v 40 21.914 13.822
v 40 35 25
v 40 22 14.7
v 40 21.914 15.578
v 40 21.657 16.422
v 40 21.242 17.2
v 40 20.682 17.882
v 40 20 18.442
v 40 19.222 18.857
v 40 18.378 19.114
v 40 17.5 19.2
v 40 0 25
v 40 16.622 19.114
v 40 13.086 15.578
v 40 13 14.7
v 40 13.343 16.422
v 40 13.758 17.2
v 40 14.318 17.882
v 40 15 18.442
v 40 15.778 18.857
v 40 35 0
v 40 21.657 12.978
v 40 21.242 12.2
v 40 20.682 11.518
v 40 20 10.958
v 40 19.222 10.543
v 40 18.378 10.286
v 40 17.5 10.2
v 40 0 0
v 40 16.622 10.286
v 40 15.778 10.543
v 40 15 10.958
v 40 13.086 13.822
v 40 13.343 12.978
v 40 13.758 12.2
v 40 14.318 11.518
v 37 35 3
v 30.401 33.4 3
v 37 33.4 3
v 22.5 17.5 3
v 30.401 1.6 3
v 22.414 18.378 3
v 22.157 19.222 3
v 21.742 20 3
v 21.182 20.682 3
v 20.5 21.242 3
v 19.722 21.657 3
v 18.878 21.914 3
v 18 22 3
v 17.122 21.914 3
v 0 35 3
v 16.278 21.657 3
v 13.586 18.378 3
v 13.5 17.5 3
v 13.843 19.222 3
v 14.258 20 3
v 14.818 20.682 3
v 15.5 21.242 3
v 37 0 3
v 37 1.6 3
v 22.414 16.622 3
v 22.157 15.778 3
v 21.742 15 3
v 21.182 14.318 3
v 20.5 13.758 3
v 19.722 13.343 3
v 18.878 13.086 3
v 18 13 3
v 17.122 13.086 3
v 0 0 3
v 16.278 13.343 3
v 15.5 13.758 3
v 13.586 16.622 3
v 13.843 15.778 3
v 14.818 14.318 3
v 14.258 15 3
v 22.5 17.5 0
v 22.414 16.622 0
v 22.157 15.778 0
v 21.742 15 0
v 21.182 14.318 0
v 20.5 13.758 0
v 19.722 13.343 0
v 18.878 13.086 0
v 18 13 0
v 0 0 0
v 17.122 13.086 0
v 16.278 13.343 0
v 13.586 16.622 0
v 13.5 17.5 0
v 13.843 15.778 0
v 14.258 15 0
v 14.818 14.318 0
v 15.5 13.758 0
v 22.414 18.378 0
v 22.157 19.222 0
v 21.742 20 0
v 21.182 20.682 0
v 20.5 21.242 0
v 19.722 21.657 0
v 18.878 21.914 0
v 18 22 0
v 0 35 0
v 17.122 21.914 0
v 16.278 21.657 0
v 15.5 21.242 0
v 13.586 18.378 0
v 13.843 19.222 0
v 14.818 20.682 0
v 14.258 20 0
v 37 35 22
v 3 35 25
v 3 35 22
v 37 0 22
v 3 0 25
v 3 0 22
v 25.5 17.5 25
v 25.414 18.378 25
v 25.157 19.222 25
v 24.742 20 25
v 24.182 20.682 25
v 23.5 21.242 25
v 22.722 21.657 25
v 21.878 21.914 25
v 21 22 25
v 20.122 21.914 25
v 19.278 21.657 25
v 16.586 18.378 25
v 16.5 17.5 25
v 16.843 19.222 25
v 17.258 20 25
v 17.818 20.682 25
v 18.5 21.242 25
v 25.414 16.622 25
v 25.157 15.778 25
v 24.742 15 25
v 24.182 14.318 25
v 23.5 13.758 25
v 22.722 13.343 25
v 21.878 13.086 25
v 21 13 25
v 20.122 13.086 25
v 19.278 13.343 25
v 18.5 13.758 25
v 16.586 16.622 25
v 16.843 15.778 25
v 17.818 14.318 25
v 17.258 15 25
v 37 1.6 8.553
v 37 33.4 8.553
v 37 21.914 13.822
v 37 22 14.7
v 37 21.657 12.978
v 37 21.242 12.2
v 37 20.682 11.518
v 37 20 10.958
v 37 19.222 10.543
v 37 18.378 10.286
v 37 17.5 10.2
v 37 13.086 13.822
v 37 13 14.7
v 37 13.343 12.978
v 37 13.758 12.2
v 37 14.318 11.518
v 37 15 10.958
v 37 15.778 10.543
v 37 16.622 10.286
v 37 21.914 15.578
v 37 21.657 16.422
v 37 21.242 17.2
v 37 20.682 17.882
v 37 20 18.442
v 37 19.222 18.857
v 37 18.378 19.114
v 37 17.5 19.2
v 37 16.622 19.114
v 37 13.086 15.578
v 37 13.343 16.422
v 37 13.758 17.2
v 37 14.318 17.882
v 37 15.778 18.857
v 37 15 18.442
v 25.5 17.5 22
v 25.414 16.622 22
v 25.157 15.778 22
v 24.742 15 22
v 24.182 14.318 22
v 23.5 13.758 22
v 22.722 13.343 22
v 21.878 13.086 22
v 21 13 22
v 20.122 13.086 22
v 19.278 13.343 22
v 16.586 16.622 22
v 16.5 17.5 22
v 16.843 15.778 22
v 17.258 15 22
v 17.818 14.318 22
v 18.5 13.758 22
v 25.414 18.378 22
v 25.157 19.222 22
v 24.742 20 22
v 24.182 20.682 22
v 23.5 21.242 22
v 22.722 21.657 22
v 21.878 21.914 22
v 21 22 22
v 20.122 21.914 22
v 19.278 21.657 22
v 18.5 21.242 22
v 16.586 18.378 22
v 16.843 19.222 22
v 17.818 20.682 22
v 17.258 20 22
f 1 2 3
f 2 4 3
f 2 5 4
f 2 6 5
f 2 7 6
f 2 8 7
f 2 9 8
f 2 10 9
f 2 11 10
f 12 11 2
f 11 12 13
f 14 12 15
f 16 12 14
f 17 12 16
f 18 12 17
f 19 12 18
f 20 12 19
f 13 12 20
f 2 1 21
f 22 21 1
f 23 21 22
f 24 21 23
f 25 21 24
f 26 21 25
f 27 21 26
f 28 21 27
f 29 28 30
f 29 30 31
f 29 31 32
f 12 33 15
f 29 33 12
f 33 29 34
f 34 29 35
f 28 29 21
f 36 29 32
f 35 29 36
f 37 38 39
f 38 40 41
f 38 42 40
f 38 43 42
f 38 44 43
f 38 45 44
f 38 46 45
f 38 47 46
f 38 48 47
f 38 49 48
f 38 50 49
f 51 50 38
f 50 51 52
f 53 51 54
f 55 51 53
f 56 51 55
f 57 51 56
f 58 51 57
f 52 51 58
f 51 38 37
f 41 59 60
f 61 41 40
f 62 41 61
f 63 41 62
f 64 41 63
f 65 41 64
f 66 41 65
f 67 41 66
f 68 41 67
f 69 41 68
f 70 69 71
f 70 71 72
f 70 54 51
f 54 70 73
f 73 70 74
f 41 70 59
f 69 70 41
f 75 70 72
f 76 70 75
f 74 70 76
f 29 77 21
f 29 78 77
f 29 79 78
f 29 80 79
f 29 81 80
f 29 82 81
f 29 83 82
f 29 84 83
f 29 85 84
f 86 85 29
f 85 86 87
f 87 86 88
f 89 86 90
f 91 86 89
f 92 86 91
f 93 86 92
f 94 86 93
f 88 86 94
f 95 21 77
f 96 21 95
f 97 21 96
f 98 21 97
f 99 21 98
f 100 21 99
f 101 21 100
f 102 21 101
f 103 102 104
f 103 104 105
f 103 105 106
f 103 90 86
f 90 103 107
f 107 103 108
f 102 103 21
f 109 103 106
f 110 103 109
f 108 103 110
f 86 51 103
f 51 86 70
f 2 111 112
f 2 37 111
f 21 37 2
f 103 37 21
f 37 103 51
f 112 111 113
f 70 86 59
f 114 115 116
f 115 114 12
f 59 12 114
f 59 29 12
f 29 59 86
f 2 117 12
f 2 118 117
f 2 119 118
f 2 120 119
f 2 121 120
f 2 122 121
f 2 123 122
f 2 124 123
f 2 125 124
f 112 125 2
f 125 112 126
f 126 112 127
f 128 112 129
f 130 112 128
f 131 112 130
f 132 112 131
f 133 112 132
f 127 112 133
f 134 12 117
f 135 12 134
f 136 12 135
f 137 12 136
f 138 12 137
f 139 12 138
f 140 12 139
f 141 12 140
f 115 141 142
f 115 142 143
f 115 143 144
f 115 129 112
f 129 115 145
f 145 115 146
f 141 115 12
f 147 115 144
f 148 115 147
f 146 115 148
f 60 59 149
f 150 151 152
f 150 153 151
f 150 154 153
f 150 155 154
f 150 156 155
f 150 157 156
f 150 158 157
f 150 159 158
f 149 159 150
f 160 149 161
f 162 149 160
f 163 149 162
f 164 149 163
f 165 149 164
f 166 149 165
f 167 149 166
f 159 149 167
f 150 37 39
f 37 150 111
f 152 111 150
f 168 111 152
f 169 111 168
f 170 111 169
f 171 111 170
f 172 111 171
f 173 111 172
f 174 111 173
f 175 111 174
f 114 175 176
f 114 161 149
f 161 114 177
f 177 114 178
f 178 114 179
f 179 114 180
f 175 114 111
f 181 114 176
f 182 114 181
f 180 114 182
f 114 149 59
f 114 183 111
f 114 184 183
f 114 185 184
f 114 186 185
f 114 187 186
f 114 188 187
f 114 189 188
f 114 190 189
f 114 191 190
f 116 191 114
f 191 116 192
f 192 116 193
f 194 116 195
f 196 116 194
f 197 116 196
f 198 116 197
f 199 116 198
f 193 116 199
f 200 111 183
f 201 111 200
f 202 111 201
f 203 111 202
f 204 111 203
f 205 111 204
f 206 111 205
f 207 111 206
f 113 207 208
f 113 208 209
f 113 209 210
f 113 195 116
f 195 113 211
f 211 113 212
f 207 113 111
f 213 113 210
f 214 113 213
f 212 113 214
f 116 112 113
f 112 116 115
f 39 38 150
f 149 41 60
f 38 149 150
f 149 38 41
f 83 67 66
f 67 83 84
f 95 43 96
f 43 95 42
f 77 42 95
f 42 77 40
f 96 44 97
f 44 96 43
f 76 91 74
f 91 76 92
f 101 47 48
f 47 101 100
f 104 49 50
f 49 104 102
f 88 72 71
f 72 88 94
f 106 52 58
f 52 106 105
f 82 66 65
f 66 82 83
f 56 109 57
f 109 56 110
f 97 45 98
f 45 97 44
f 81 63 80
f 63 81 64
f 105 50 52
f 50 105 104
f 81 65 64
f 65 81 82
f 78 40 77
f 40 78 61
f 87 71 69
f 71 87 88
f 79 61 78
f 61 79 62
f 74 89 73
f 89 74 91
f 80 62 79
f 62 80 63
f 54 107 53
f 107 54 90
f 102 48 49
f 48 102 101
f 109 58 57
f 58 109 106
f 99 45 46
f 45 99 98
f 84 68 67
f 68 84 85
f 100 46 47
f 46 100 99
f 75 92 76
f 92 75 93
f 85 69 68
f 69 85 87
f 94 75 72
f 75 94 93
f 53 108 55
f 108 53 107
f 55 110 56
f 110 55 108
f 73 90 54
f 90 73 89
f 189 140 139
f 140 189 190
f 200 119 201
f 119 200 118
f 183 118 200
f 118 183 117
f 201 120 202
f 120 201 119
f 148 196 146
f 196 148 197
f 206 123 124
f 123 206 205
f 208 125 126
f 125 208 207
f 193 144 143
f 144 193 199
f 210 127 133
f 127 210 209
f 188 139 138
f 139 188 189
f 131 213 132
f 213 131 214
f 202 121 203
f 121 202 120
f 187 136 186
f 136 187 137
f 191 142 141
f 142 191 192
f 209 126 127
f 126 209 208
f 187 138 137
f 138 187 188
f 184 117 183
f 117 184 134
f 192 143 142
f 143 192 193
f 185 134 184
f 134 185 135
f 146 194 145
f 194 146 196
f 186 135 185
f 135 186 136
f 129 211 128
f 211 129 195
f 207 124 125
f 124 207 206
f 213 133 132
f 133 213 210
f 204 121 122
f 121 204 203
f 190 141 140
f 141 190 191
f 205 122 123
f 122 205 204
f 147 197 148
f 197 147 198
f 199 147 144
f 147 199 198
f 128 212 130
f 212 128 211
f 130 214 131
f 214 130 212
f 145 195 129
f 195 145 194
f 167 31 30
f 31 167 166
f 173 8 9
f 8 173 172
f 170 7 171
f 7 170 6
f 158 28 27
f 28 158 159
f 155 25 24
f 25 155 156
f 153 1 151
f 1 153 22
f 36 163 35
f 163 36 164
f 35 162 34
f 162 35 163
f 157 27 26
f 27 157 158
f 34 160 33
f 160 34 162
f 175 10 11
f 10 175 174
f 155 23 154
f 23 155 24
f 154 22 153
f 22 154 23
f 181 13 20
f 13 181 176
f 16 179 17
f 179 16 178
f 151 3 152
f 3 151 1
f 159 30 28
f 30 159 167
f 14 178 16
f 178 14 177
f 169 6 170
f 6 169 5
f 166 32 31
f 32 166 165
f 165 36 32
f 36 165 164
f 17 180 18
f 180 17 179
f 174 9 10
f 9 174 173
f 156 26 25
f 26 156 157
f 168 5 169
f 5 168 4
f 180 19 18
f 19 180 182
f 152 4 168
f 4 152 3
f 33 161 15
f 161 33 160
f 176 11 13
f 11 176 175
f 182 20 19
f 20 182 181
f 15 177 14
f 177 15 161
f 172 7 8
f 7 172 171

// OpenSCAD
$fn = 32;

// ----------------------------------------------------------------------
// Z-bracket: 40 x 35 x 25 mm
// ----------------------------------------------------------------------

// --- parameters (mm) ---
bottom_run = 40;          // lower foot length, X
top_run = 34;             // upper foot length, X
profile_w = 35;           // bracket width, Y
height = 25;              // overall rise, Z
mat_t = 3;                // plate thickness
hole_d = 9;               // clearance for M8
rib_len = 8.5;            // gusset leg
rib_sink = 1.6;           // gusset overlap into the plates

module hole_z(px, py, z0) {
  translate([px, py, z0 - 2.5]) cylinder(h = mat_t + 5, d = hole_d);
}
module hole_x(py, pz) {
  translate([-2.5, py, pz]) rotate([0, 90, 0]) cylinder(h = mat_t + 5, d = hole_d);
}
module gusset(x0) {
  translate([x0, profile_w - rib_sink, 0])
    rotate([90, 0, 0])
      linear_extrude(height = profile_w - 2 * rib_sink)
        polygon(points = [[rib_sink, mat_t - rib_sink],
                          [rib_sink, mat_t - rib_sink + rib_len],
                          [-rib_len, mat_t - rib_sink]]);
}

difference() {
  union() {
    cube([bottom_run, profile_w, mat_t]);
    /* web, overlapping the lower foot */
    translate([bottom_run - mat_t, 0, 0]) cube([mat_t, profile_w, height]);
    /* upper foot, sunk into the web */
    translate([bottom_run - mat_t - top_run, 0, height - mat_t]) cube([top_run + mat_t, profile_w, mat_t]);
    gusset(bottom_run - mat_t);
  }
  hole_z(18, 17.5, 0);
  translate([bottom_run - mat_t - 16, 0, 0]) hole_z(0, 17.5, height - mat_t);
  translate([bottom_run - mat_t, 0, 0]) hole_x(17.5, 14.7);
}
